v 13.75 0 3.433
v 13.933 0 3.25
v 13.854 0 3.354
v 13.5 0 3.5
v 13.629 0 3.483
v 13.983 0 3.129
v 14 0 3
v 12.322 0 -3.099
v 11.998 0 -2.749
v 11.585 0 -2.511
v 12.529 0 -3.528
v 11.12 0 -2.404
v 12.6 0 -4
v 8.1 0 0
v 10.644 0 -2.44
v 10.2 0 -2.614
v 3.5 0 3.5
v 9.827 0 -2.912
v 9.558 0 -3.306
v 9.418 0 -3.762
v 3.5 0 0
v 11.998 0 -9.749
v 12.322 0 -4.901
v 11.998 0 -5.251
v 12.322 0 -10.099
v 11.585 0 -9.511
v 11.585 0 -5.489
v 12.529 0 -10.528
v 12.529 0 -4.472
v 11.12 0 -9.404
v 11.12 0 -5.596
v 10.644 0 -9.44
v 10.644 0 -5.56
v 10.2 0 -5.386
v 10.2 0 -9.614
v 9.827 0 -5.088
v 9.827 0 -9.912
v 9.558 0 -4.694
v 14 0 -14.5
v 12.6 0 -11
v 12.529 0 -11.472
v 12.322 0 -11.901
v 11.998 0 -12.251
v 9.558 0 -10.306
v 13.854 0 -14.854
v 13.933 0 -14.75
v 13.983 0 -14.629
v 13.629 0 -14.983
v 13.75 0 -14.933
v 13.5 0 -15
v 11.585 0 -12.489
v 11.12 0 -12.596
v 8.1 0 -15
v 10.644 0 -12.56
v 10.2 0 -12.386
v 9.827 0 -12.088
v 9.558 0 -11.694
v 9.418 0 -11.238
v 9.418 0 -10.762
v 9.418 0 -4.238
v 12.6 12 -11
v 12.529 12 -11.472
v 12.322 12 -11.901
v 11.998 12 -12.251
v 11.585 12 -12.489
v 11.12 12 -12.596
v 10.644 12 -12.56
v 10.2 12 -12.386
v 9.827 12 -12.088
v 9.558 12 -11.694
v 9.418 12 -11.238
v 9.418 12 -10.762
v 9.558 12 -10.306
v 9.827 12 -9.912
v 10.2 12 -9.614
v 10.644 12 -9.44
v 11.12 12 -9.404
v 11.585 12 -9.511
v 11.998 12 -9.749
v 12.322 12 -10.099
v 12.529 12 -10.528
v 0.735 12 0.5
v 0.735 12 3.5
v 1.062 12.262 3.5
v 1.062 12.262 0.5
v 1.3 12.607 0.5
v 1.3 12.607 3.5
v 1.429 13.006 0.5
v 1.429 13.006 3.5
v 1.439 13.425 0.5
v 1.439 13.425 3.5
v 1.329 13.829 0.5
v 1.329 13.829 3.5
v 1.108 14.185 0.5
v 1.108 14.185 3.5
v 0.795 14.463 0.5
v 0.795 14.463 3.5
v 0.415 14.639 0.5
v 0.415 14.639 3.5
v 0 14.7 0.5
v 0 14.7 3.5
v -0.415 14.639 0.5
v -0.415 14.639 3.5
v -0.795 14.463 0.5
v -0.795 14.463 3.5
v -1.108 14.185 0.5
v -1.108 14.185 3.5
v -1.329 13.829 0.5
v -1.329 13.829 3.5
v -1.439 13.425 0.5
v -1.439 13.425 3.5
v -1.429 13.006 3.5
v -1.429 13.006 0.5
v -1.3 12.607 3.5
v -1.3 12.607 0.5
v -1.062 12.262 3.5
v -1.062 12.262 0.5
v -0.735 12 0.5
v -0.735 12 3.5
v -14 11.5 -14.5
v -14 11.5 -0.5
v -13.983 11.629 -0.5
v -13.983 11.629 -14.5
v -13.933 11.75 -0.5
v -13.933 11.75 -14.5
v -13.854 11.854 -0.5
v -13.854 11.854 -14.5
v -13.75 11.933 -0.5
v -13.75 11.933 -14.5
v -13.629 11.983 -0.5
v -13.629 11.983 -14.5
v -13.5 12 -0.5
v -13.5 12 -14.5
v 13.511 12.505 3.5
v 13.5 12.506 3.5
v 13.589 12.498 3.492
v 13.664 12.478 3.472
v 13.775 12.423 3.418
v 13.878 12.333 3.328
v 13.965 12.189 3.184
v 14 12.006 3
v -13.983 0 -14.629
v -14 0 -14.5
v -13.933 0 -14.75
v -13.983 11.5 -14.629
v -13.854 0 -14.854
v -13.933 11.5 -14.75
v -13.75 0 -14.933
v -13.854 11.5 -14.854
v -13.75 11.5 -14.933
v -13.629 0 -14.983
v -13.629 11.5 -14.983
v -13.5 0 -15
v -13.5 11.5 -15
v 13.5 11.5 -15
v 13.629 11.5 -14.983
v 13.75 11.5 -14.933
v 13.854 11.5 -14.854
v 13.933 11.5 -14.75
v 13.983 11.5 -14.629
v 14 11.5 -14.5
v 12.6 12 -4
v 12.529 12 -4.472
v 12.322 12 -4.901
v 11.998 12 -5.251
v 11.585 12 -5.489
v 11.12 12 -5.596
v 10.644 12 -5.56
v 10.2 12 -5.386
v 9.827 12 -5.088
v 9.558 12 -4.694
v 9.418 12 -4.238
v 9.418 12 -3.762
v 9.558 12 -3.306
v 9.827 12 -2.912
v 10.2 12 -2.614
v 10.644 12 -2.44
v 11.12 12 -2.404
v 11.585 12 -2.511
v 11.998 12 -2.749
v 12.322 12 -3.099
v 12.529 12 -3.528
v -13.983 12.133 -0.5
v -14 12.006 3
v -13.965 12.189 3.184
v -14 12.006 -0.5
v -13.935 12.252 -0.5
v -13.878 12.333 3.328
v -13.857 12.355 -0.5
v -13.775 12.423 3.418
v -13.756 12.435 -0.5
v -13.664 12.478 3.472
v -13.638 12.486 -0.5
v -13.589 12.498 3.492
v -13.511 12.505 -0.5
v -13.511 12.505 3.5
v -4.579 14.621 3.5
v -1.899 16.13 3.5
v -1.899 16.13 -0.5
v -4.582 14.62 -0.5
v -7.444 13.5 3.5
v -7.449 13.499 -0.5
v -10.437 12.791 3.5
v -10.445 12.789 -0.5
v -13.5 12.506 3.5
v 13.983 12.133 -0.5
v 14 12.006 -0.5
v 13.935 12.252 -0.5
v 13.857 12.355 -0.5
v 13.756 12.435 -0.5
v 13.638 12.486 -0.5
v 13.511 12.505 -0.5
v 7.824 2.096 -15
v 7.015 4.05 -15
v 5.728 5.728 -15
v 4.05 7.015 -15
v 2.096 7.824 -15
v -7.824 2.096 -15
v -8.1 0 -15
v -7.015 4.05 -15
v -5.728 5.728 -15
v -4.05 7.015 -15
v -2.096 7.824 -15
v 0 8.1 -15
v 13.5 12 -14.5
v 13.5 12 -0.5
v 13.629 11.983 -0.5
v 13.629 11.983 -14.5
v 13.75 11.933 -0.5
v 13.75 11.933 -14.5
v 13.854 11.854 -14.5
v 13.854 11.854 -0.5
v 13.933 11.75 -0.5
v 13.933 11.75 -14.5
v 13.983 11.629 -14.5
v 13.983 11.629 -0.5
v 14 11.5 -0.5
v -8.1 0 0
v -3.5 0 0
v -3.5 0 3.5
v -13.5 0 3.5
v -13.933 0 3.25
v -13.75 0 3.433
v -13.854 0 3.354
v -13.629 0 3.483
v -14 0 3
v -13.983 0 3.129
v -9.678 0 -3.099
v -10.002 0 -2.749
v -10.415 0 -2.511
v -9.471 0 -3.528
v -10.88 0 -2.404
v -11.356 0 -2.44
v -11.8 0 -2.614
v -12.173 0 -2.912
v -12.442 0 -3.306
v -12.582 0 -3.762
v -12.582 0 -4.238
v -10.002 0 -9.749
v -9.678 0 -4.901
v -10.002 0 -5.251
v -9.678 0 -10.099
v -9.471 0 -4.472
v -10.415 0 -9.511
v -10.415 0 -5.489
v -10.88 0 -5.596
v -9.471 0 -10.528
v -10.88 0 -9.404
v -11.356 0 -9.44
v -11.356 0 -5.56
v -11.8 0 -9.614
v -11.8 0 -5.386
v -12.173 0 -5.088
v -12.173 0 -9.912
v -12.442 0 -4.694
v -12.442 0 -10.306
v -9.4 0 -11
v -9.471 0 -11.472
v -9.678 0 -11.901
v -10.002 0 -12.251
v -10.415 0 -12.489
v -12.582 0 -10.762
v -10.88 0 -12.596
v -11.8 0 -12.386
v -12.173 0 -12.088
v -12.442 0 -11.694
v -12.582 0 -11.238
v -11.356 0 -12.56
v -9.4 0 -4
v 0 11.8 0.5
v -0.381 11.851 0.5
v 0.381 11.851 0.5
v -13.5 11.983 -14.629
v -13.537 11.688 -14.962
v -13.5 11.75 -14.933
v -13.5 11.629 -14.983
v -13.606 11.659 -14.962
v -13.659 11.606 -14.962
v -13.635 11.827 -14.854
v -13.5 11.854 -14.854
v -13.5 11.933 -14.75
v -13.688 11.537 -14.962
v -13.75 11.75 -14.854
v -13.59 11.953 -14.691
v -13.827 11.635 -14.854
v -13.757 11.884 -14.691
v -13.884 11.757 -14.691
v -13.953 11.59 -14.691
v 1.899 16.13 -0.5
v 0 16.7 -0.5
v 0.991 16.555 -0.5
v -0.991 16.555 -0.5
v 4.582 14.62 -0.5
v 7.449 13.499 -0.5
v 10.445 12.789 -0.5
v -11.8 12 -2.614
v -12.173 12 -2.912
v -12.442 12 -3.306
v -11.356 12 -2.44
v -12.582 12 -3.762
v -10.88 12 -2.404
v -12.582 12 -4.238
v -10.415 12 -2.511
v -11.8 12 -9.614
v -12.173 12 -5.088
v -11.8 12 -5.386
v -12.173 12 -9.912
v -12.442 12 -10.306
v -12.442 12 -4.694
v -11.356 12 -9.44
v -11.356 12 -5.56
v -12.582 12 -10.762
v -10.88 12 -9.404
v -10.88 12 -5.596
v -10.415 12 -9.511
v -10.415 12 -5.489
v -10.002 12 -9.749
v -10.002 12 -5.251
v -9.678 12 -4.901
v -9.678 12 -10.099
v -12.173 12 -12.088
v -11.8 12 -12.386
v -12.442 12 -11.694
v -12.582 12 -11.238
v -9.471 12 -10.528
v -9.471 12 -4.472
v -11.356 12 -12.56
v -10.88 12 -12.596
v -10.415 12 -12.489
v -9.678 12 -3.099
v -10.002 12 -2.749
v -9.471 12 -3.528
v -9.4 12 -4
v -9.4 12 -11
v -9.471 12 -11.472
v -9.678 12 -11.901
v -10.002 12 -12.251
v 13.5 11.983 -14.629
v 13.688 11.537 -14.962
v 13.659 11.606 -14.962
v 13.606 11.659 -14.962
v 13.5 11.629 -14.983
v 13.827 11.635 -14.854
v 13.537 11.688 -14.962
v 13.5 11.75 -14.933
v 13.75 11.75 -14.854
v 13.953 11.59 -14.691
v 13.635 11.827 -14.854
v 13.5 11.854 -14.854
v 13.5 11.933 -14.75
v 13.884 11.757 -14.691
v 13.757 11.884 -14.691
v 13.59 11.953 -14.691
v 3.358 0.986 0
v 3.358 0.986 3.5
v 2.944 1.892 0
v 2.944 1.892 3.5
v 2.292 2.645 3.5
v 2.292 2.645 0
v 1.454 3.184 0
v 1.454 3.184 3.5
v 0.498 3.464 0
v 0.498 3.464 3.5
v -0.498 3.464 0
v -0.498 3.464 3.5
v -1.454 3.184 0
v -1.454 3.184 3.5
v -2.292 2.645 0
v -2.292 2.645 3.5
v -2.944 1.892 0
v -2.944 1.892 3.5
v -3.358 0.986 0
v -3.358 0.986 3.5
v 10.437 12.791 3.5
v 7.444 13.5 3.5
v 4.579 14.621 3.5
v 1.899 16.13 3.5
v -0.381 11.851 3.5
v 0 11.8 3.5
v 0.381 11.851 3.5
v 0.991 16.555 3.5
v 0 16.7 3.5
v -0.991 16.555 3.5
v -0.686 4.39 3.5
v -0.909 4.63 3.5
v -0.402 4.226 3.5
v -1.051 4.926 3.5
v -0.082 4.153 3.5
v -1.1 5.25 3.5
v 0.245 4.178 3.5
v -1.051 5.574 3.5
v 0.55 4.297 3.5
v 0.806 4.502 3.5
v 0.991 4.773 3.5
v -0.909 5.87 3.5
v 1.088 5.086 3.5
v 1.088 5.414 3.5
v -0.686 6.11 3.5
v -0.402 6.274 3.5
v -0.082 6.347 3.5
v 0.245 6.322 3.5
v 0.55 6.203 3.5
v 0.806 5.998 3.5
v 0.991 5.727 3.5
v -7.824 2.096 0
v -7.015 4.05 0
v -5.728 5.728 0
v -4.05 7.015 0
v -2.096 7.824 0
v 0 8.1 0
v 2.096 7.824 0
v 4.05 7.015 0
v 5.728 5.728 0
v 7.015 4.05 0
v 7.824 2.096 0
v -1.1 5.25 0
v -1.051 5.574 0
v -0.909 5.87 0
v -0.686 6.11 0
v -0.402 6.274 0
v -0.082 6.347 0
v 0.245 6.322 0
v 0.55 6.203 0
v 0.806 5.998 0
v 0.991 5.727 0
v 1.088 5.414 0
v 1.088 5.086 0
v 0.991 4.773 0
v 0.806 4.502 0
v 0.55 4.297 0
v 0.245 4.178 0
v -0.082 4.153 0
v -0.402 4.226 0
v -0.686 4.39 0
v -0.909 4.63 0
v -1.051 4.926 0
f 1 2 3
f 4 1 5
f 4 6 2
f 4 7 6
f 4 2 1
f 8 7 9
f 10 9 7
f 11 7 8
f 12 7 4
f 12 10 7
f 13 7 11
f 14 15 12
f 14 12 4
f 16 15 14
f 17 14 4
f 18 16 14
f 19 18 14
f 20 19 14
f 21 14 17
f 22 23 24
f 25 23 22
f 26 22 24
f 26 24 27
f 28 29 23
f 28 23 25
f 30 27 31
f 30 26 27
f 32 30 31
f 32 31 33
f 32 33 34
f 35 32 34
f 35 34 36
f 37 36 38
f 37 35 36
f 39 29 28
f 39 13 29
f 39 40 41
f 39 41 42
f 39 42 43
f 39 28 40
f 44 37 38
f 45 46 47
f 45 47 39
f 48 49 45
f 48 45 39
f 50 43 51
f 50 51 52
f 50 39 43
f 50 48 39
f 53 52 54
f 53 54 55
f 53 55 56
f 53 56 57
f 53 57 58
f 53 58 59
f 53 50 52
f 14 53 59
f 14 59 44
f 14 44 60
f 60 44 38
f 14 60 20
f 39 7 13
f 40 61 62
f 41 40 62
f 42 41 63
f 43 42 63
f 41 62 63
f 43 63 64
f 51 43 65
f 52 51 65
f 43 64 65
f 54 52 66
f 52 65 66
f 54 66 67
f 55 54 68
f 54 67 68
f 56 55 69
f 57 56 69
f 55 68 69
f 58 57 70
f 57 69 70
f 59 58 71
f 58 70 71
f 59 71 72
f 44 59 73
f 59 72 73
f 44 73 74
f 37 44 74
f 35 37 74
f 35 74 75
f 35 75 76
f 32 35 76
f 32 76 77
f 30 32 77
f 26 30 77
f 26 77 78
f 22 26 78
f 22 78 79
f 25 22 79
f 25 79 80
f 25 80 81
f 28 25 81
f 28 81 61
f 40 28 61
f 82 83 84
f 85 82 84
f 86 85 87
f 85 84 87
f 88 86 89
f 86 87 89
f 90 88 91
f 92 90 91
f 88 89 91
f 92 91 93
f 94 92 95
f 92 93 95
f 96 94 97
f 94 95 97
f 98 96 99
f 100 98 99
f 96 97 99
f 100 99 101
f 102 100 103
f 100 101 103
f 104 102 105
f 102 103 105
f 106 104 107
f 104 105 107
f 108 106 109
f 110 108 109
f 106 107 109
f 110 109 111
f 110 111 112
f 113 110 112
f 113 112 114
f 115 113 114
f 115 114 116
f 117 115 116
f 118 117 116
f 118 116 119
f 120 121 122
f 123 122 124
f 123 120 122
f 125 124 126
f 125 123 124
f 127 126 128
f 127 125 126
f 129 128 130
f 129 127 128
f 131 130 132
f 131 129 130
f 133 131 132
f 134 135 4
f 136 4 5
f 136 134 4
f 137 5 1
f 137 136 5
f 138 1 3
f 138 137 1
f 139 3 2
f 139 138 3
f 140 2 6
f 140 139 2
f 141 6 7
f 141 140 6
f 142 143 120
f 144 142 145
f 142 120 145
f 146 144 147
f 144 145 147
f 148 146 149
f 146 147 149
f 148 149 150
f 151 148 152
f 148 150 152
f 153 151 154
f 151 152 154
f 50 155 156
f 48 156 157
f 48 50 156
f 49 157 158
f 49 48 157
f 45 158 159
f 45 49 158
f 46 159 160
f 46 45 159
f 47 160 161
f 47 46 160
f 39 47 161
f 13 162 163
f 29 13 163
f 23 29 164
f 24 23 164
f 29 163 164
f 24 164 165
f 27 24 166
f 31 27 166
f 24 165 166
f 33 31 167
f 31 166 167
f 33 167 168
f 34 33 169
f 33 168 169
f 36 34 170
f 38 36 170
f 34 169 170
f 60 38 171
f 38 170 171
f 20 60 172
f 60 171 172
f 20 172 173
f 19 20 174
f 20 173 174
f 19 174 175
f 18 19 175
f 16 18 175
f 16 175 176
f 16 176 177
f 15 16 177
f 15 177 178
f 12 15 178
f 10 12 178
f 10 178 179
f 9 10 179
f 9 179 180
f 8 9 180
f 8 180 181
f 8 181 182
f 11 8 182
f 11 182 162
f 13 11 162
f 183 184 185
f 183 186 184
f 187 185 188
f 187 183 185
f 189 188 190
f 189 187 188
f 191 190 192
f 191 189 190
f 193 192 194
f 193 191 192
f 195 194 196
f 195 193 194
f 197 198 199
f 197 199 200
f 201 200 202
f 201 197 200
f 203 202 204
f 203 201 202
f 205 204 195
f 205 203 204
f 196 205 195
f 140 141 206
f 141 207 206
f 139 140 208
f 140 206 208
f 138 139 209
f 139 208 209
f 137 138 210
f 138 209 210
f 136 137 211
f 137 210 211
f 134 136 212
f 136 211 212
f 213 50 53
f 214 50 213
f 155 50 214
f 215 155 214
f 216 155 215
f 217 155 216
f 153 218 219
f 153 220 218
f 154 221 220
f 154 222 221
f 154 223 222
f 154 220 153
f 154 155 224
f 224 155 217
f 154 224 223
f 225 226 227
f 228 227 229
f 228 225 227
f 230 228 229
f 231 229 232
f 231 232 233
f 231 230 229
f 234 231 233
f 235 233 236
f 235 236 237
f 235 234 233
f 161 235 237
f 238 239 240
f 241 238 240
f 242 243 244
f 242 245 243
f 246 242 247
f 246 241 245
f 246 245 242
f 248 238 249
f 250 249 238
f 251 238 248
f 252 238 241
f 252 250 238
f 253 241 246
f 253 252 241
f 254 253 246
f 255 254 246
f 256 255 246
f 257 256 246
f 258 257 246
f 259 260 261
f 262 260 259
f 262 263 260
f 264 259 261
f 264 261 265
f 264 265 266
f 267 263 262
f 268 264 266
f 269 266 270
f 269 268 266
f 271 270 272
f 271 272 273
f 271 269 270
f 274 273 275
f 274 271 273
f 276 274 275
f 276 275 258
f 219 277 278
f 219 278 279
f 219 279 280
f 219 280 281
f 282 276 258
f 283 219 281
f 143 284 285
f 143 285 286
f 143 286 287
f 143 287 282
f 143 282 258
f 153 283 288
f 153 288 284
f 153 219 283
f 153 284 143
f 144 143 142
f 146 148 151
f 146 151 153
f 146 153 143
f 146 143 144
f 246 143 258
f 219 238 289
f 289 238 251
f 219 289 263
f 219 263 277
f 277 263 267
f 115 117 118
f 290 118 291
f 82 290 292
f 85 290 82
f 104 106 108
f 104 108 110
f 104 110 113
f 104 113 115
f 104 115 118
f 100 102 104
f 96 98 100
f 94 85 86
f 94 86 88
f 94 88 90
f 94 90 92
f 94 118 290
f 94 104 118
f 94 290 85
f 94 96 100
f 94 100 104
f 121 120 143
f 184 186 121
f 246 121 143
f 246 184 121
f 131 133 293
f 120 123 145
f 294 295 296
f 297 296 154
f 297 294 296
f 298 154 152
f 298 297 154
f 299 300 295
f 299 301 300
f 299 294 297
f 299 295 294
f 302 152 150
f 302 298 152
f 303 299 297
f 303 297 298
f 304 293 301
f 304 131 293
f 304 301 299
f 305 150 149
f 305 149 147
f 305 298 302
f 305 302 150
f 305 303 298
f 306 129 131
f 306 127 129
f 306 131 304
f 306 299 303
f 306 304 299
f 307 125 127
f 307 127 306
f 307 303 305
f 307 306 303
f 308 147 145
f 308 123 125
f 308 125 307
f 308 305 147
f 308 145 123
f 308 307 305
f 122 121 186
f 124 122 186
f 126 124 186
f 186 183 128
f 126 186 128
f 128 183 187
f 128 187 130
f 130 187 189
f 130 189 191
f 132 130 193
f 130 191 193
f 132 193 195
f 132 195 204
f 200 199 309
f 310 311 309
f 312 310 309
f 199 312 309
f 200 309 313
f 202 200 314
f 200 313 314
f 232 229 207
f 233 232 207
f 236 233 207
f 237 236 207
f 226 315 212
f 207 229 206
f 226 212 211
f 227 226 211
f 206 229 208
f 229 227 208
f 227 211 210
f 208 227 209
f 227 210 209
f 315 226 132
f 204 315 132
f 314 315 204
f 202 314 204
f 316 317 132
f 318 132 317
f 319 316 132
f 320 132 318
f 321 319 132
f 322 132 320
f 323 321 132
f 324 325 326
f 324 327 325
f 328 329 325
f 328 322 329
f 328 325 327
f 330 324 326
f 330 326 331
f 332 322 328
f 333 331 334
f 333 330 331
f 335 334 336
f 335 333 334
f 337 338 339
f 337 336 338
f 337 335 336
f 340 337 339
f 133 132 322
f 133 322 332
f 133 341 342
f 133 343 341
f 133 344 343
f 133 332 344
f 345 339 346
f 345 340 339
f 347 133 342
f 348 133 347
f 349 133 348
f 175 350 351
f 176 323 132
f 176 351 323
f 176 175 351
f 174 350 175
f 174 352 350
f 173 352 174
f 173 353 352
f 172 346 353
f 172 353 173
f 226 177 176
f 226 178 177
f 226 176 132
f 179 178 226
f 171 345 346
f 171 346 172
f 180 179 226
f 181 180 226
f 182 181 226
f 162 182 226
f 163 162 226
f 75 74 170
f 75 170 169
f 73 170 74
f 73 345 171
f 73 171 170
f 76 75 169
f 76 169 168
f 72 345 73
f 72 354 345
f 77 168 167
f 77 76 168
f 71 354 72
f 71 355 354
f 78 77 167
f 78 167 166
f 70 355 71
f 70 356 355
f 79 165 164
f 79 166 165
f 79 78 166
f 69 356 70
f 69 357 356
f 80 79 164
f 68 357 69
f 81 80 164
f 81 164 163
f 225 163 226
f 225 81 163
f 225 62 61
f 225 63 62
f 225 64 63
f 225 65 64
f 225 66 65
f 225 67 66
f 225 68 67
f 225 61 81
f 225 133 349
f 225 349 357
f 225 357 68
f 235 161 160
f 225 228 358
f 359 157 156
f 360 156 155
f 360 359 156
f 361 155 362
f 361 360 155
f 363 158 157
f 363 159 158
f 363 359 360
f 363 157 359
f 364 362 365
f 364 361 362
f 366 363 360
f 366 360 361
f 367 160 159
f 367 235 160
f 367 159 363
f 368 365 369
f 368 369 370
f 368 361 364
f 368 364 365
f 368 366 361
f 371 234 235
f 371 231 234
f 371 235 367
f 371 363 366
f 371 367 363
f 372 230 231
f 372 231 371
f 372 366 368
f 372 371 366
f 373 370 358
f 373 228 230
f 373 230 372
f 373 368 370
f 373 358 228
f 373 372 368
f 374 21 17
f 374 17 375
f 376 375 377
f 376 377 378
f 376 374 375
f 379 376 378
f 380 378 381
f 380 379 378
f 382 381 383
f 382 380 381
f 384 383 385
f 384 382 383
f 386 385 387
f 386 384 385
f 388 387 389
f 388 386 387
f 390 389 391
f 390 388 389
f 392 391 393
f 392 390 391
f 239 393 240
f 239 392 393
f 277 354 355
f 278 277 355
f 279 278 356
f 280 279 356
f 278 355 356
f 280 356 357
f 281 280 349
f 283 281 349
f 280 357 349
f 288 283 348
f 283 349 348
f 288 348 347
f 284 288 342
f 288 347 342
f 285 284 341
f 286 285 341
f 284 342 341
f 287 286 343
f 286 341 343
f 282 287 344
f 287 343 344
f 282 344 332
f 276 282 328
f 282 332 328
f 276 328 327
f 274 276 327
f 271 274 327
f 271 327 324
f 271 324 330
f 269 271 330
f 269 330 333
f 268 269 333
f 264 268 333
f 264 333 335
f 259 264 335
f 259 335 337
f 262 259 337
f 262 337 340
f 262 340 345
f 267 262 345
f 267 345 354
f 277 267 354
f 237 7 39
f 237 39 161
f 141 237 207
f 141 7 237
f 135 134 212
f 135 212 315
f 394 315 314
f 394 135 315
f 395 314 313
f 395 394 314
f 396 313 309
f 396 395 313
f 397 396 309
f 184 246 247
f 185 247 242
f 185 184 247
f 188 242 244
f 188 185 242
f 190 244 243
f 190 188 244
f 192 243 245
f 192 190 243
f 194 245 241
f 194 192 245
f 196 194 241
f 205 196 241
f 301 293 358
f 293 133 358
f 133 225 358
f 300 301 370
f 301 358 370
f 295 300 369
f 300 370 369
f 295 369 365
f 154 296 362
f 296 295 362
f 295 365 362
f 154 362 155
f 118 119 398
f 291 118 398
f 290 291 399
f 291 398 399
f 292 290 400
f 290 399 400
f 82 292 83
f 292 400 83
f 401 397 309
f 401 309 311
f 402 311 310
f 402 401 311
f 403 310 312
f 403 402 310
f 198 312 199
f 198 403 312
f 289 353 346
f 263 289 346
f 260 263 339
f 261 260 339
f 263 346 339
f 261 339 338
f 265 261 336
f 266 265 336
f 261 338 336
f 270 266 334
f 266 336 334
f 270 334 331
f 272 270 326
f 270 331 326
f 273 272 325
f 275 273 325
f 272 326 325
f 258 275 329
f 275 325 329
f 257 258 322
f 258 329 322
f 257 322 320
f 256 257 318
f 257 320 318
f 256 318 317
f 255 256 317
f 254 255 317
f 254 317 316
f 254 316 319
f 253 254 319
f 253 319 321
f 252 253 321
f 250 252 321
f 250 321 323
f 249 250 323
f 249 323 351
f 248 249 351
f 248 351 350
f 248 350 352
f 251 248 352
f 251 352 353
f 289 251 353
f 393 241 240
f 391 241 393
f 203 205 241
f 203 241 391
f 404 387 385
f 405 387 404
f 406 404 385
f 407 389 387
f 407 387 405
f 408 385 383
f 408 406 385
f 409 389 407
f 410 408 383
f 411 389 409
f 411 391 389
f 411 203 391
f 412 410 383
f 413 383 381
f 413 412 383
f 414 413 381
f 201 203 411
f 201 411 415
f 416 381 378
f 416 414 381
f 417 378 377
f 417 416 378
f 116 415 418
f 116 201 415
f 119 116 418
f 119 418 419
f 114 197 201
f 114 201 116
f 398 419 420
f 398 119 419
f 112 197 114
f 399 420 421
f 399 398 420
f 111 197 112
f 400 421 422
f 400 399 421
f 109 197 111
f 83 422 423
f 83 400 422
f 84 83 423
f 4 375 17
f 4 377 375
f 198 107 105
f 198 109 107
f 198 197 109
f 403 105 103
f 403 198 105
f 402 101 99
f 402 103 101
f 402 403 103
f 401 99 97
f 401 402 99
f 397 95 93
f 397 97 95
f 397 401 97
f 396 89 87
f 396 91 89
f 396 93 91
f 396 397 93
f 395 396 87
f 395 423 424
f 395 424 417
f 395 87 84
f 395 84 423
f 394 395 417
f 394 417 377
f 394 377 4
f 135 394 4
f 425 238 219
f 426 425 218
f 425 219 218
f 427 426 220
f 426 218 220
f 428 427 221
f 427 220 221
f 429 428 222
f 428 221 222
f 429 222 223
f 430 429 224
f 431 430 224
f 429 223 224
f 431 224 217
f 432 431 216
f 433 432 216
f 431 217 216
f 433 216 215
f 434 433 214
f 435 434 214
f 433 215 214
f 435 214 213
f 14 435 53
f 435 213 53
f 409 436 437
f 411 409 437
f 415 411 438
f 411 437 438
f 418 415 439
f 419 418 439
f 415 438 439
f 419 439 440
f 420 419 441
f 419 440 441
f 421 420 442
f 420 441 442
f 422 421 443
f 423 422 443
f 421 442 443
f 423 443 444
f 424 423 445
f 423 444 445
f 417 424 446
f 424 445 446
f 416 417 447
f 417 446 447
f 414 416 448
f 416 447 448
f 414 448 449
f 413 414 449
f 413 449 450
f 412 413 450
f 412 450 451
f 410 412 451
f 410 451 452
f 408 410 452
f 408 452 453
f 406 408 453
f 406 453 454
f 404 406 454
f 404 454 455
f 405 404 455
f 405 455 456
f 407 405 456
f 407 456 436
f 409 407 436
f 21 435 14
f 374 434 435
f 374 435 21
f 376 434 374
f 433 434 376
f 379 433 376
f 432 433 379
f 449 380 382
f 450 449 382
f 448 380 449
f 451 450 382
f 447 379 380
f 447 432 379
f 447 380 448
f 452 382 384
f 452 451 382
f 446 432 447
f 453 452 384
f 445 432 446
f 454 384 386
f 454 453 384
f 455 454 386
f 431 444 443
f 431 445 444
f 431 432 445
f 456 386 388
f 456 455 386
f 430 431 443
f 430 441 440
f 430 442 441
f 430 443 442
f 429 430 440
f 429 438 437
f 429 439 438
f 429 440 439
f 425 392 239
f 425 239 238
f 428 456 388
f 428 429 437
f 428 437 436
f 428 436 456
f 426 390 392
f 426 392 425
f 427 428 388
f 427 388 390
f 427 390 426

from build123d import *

# Parameters (mm, degrees)
BOSS_EXTRUDE1_DEPTH  = 15
M3_CLEARANCE_HOLE1_D = 3.2
BOSS_EXTRUDE2_DEPTH  = 3.5
M2_CLEARANCE_HOLE2_D = 2.2
SKETCH8_R            = 1.45
BOSS_EXTRUDE3_DEPTH  = 4
SKETCH8_3_R          = 1.45
CUT_EXTRUDE1_DEPTH   = 3
FILLET3_R            = 0.5
SKETCH11_R           = 8.1
CUT_EXTRUDE3_DEPTH   = 15


with BuildPart() as part:
    # Sketch1 → Boss-Extrude1 (new body)
    with BuildSketch(Plane.XY):
        with BuildLine():
            Line((-8, 0), (-14, 0))
            Line((-14, 0), (-14, 12))
            Line((-14, 12), (14, 12))
            Line((14, 12), (14, 0))
            Line((14, 0), (8, 0))
            ThreePointArc((8, 0), (0, 8), (-8, 0))
        make_face()
    extrude(amount=-BOSS_EXTRUDE1_DEPTH)

    # M3 Clearance Hole1 (through all)
    with Locations(Plane(origin=(0, 0, 0), x_dir=(-1, 0, 0), z_dir=(0, -1, 0))):
        with Locations((11, 11), (11, 4), (-11, 11), (-11, 4)):
            Hole(M3_CLEARANCE_HOLE1_D / 2)

    # Sketch5 → Boss-Extrude2 (add)
    with BuildSketch(Plane.XY):
        with BuildLine():
            Line((-3.5, 0), (-14, 0))
            Line((-14, 0), (-14, 12))
            Line((-14, 12), (14, 12))
            Line((14, 12), (14, 0))
            Line((14, 0), (3.5, 0))
            ThreePointArc((3.5, 0), (0, 3.5), (-3.5, 0))
        make_face()
    extrude(amount=BOSS_EXTRUDE2_DEPTH)

    # M2 Clearance Hole2 (through all)
    with Locations(Plane.XY.offset(3.5)):
        with Locations((0, 5.25)):
            Hole(M2_CLEARANCE_HOLE2_D / 2)

    # Sketch8 → Boss-Extrude3 (add)
    with BuildSketch(Plane.XY.offset(3.5)):
        with BuildLine():
            Line((-14, 12.5), (-14, 12))
            Line((-14, 12), (-0.734846923, 12))
            ThreePointArc((-0.734846923, 12), (-0.720059707, 14.508576187), (1.45, 13.25))
            ThreePointArc((1.45, 13.25), (1.258576187, 12.529940293), (0.734846923, 12))
            Line((0.734846923, 12), (14, 12))
            Line((14, 12), (14, 12.5))
            ThreePointArc((14, 12.5), (7.683135649, 13.42711883), (1.899082569, 16.130275229))
            ThreePointArc((1.899082569, 16.130275229), (0, 16.7), (-1.899082569, 16.130275229))
            ThreePointArc((-1.899082569, 16.130275229), (-7.683135649, 13.42711883), (-14, 12.5))
        make_face()
        with Locations((0, 13.25)):
            Circle(SKETCH8_R)
    extrude(amount=-BOSS_EXTRUDE3_DEPTH)

    # Sketch8<3> → Cut-Extrude1 (cut)
    with BuildSketch(Plane.XY.offset(3.5)):
        with Locations((0, 13.25)):
            Circle(SKETCH8_3_R)
        with BuildLine():
            ThreePointArc((1.45, 13.25), (-0.720059707, 14.508576187), (-0.734846923, 12))
            Line((-0.734846923, 12), (0.734846923, 12))
            ThreePointArc((0.734846923, 12), (1.258576187, 12.529940293), (1.45, 13.25))
        make_face()
        with BuildLine():
            Line((0.734846923, 12), (-0.734846923, 12))
            ThreePointArc((-0.734846923, 12), (0, 11.8), (0.734846923, 12))
        make_face()
    extrude(amount=-CUT_EXTRUDE1_DEPTH, mode=Mode.SUBTRACT)

    # Fillet3
    fillet3_edges = [part.edges().sort_by_distance(p)[0] for p in [
        (-14, 12, -7.75),
        (14, 12, -7.75),
        (14, 6, -15),
        (0, 12, -15),
        (-14, 6, -15),
        (14, 6.25, 3.5),
        (-14, 6.25, 3.5),
        (14, 12.5, 1.5),
        (-14, 12.5, 1.5),
    ]]
    fillet(fillet3_edges, radius=FILLET3_R)

    # Sketch11 → Cut-Extrude3 (cut)
    with BuildSketch(Plane(origin=(0, 0, -15), x_dir=(-1, 0, 0), z_dir=(0, 0, -1))):
        Circle(SKETCH11_R)
    extrude(amount=-CUT_EXTRUDE3_DEPTH, mode=Mode.SUBTRACT)


solid = part.part
